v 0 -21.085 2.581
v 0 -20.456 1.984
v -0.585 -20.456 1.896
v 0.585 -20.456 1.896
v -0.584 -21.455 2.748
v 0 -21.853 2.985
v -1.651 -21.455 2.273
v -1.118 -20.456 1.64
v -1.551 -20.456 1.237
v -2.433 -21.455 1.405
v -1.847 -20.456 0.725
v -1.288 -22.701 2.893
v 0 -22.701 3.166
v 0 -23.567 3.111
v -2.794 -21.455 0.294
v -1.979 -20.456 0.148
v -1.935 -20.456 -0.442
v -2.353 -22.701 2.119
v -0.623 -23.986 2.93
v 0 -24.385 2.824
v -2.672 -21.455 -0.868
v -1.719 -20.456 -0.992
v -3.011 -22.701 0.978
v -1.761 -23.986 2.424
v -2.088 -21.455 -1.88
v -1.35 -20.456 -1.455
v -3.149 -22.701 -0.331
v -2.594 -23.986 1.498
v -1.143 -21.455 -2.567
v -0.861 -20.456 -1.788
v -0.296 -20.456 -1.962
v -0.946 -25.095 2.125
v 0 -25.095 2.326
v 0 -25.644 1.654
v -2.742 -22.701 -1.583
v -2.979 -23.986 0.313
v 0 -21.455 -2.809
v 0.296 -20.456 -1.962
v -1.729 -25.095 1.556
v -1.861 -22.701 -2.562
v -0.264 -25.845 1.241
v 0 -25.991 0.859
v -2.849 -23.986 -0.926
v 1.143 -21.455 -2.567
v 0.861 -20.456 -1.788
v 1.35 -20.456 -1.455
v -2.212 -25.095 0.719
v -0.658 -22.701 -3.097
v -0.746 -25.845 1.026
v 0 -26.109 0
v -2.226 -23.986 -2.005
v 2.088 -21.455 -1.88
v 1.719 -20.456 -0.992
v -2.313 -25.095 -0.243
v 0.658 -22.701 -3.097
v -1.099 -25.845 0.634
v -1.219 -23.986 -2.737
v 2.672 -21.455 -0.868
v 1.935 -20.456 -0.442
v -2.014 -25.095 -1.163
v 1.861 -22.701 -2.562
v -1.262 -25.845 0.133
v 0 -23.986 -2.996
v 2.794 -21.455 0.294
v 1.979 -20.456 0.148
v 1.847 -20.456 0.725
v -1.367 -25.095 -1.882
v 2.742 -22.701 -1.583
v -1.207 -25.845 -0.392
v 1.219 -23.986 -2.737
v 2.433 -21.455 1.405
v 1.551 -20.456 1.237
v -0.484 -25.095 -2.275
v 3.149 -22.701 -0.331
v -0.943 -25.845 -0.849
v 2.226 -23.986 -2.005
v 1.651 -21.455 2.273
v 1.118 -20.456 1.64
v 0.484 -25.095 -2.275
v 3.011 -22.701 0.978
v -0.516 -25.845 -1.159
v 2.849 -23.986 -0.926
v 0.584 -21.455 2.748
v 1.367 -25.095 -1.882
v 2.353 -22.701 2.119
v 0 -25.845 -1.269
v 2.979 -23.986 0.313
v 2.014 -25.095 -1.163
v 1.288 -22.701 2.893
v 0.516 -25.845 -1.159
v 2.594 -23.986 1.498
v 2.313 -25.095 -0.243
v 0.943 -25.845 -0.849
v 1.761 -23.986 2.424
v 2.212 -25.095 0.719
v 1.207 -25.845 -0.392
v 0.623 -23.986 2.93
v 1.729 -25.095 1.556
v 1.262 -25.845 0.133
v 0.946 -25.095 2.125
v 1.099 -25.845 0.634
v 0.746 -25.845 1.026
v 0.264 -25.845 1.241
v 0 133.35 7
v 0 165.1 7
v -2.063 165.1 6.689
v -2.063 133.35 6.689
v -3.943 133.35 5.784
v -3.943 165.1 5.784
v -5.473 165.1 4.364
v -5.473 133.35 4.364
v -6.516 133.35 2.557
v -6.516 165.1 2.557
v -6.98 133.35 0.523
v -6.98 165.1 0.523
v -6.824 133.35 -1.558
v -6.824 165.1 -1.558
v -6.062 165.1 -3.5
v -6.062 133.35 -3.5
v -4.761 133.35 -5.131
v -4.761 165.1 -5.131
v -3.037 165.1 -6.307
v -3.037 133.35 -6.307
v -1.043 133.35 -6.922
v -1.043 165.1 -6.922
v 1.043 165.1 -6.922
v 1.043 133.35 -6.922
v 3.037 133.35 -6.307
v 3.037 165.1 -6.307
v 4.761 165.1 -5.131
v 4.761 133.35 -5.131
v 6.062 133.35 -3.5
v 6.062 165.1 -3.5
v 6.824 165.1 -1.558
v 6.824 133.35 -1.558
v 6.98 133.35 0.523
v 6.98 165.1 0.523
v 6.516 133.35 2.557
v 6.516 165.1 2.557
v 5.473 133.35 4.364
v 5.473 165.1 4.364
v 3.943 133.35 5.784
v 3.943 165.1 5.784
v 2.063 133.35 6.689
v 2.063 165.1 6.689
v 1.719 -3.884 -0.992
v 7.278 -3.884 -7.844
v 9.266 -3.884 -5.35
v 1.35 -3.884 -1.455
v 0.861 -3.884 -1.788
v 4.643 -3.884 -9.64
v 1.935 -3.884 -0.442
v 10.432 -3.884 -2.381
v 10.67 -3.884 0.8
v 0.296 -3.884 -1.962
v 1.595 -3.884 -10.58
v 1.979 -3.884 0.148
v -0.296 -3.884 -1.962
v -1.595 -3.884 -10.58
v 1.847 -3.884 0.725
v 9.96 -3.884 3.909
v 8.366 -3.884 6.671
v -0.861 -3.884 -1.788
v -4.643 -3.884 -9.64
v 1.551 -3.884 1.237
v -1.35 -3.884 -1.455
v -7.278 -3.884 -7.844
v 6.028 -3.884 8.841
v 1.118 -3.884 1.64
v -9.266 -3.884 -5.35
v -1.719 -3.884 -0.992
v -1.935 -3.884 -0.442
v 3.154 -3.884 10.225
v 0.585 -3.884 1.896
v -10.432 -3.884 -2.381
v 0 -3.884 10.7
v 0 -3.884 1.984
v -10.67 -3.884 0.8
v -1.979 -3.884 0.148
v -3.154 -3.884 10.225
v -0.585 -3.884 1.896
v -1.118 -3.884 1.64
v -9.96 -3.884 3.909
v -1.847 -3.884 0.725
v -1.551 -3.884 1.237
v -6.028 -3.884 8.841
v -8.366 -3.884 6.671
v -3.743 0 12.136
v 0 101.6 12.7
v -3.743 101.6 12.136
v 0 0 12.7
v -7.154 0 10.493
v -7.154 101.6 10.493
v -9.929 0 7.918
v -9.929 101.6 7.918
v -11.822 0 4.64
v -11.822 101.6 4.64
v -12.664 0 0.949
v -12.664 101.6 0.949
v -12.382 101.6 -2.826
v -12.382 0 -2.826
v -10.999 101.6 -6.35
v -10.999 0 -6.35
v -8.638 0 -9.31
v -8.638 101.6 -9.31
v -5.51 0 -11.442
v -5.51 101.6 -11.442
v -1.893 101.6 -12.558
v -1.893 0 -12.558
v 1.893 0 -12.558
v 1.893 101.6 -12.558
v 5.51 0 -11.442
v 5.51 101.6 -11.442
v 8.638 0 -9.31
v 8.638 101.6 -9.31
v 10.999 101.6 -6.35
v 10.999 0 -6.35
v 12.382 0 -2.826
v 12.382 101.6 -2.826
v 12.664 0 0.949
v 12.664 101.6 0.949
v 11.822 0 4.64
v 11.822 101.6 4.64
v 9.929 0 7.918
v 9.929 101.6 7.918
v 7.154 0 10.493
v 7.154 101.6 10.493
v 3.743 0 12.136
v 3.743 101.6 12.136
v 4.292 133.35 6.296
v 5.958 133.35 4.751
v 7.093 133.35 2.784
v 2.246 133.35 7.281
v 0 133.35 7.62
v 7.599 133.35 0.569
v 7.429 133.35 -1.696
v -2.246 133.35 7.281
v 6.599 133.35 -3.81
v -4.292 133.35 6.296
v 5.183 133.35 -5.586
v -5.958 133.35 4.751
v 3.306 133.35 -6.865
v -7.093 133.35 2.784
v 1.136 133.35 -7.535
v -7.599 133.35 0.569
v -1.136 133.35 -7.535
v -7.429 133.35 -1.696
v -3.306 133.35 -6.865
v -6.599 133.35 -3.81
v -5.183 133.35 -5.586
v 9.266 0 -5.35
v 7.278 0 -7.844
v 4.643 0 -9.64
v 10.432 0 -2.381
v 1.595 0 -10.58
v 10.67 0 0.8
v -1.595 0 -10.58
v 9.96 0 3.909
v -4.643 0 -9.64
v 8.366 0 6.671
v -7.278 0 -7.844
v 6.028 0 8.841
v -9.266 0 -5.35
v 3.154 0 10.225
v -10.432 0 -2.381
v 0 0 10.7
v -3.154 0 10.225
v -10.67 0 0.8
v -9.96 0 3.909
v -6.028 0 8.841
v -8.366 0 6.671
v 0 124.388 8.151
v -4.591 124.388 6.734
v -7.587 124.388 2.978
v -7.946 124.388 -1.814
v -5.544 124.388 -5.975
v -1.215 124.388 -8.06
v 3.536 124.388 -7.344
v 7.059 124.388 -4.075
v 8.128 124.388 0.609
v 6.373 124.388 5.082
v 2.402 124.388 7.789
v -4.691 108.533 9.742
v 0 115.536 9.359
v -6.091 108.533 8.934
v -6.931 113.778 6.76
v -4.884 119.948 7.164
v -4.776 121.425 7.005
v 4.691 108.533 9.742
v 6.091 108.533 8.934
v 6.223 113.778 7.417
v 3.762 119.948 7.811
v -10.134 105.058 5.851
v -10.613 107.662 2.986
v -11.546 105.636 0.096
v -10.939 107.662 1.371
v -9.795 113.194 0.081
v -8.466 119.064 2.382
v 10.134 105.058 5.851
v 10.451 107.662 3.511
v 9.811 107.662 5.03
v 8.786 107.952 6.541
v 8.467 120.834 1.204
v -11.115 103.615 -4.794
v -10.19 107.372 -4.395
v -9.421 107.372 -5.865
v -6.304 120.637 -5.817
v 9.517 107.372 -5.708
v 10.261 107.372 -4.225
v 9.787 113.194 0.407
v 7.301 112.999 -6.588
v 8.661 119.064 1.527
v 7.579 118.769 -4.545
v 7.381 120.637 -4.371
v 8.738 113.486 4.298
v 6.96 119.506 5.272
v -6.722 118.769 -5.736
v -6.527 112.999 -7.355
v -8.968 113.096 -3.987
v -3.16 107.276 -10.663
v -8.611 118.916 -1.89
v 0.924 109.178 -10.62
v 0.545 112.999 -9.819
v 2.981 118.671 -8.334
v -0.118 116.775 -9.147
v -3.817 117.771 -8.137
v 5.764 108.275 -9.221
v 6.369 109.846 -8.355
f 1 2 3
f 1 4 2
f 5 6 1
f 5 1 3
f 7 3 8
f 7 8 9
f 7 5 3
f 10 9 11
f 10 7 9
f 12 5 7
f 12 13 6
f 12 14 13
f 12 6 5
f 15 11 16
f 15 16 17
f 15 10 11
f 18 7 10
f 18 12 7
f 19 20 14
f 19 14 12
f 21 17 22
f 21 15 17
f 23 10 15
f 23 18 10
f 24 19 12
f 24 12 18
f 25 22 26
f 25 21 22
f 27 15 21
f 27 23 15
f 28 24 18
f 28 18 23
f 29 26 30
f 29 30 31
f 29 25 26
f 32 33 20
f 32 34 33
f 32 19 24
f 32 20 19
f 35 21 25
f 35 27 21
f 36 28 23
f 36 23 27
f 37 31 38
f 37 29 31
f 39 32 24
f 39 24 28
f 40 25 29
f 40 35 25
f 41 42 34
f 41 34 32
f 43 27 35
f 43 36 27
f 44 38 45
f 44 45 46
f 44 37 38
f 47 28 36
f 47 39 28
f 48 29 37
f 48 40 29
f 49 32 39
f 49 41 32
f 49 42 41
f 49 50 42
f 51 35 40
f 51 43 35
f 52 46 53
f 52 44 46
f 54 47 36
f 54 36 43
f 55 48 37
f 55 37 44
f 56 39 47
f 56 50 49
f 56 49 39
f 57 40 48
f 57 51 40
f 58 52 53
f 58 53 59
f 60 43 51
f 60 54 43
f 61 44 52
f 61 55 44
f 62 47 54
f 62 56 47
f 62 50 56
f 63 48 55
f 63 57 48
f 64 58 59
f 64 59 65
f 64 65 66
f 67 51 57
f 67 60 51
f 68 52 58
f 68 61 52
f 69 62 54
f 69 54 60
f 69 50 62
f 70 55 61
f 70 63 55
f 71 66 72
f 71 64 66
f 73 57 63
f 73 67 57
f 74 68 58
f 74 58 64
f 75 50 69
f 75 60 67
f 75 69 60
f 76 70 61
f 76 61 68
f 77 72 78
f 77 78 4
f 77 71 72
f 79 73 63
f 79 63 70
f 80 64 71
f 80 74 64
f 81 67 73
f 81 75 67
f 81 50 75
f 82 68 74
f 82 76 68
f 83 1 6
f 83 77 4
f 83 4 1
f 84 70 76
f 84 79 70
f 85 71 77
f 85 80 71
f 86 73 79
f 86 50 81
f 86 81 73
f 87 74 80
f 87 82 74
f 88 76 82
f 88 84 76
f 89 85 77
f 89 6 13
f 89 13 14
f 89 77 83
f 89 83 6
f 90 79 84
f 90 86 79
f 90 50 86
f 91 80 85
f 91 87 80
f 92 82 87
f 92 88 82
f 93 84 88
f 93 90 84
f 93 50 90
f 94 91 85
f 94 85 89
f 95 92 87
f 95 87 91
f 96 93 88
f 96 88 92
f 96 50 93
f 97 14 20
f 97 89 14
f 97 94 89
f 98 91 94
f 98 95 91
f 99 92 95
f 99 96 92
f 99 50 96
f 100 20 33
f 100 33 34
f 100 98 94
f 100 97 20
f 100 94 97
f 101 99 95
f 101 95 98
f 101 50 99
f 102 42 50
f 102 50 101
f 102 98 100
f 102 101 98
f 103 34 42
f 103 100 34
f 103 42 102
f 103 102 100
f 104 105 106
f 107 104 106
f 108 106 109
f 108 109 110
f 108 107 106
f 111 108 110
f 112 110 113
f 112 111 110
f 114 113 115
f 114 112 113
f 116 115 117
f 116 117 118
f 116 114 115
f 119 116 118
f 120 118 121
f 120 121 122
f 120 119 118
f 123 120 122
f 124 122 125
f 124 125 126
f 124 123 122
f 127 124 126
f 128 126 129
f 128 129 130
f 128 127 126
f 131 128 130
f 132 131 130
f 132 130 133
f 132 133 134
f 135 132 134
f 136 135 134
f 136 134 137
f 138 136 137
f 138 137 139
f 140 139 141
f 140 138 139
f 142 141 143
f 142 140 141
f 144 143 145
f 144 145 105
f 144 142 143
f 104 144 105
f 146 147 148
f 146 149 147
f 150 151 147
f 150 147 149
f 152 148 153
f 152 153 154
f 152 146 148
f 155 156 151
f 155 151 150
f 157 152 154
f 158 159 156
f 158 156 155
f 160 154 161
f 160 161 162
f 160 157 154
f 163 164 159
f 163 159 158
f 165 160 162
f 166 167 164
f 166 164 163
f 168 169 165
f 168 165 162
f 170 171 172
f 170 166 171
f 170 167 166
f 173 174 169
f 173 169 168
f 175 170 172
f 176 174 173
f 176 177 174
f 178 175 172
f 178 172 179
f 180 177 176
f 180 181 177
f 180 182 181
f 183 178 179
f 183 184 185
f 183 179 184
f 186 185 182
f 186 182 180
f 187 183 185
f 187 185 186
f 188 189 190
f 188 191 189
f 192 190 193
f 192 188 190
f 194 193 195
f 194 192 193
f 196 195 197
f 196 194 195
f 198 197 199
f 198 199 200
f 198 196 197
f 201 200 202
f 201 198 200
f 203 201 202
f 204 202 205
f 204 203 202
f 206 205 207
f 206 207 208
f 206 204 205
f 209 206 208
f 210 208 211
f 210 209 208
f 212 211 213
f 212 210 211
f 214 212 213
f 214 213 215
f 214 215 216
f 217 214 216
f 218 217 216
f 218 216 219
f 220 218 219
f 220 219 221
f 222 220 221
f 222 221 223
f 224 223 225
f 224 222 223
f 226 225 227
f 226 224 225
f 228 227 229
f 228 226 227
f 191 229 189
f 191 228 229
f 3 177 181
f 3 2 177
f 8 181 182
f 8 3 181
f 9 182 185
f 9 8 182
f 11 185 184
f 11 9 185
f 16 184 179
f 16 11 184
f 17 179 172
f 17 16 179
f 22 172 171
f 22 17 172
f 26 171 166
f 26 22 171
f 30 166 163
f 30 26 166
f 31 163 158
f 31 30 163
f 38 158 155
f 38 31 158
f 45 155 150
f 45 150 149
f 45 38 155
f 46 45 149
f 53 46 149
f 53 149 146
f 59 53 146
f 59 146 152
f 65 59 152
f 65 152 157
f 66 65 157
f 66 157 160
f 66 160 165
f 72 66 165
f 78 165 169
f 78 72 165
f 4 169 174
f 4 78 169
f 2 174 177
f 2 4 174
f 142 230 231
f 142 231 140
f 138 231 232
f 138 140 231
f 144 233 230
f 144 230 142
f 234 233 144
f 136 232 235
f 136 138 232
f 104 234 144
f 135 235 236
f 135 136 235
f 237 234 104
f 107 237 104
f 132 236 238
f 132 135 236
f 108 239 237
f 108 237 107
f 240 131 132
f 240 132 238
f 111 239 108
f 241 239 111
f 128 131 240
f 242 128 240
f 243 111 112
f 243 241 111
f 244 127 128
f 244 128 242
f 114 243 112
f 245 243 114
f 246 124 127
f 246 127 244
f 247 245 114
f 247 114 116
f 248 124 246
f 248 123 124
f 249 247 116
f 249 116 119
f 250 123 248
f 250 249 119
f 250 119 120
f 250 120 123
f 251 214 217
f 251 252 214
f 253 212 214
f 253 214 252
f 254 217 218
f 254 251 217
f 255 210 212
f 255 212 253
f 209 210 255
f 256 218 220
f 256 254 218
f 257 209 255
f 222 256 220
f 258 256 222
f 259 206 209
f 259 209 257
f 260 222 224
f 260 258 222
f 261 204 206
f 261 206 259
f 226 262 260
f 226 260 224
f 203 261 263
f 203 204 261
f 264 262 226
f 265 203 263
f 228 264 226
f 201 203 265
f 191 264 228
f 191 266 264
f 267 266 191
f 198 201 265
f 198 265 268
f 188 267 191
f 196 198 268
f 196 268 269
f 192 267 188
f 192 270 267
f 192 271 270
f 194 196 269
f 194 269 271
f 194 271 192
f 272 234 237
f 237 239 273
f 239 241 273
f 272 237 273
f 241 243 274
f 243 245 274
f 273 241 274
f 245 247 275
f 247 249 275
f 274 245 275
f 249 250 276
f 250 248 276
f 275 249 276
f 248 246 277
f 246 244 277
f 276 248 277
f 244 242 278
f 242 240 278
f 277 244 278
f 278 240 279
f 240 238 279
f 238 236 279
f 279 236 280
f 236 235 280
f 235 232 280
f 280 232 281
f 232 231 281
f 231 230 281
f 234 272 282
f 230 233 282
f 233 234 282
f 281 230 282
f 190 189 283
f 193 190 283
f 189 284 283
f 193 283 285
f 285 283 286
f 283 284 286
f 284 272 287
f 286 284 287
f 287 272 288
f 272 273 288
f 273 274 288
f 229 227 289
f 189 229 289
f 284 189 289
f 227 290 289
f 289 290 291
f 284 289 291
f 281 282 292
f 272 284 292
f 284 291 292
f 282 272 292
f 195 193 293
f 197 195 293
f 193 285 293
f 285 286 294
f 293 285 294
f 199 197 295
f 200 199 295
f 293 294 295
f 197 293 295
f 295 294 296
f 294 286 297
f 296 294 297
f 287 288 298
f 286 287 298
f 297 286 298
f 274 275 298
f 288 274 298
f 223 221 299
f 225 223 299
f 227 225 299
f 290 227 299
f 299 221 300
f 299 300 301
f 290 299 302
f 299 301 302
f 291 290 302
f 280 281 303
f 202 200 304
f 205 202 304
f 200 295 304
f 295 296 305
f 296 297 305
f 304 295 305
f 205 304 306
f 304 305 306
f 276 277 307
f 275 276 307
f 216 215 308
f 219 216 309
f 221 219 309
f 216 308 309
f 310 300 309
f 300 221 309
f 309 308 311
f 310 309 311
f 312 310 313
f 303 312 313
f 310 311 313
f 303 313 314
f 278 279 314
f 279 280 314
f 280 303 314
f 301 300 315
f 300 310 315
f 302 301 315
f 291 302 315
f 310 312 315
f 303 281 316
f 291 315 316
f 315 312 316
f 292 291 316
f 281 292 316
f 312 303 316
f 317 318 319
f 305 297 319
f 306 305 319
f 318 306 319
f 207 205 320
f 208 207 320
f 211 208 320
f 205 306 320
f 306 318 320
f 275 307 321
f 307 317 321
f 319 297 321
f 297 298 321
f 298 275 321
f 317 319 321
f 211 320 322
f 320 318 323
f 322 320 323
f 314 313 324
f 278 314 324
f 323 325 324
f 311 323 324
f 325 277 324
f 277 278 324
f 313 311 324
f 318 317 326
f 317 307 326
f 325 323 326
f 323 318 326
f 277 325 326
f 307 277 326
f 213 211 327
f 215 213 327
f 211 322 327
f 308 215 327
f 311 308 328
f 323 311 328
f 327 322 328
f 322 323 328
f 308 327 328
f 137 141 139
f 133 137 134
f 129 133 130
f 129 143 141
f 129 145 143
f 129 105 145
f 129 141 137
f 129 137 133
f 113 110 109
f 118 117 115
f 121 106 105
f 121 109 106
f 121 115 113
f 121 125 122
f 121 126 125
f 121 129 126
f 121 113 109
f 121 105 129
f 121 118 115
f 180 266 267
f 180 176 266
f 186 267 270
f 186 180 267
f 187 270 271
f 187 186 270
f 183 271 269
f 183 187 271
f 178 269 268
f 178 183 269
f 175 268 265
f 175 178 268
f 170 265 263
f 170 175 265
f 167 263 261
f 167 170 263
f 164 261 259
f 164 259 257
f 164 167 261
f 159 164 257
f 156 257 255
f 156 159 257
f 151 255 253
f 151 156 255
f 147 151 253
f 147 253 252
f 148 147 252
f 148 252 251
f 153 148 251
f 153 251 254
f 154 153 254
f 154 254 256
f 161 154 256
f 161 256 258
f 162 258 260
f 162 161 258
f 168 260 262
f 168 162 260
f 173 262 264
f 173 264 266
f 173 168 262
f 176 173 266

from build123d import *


with BuildPart() as part:
    # Sketch1 → Revolve3 (revolve)
    with BuildSketch(Plane.XY, mode=Mode.PRIVATE) as revolve3_sk:
        with BuildLine():
            Line((12.7, 0), (10.7, 0))
            Line((10.7, 0), (10.7, -3.884392891))
            Line((10.7, -3.884392891), (1.984375, -3.884392891))
            Line((1.984375, -3.884392891), (1.984375, -20.455909311))
            ThreePointArc((1.984375, -20.455909311), (2.995814611, -23.985925019), (0, -26.109392891))
            Line((0, -26.109392891), (0, 165.1))
            Line((0, 165.1), (7, 165.1))
            Line((7, 165.1), (7, 133.35))
            Line((7, 133.35), (7.62, 133.35))
            add(Edge.make_bspline(
                [(12.7, 101.6), (7.965904328, 117.119921913), (7.62, 133.35)],
                knots=[0, 0, 0, 1, 1, 1], degree=2))
            Line((12.7, 101.6), (12.7, 0))
        make_face()
    revolve(revolve3_sk.sketch.rotate(Axis((0, 165.1, 0), (0, -1, 0)), 90), axis=Axis((0, 165.1, 0), (0, -1, 0)))


solid = part.part
